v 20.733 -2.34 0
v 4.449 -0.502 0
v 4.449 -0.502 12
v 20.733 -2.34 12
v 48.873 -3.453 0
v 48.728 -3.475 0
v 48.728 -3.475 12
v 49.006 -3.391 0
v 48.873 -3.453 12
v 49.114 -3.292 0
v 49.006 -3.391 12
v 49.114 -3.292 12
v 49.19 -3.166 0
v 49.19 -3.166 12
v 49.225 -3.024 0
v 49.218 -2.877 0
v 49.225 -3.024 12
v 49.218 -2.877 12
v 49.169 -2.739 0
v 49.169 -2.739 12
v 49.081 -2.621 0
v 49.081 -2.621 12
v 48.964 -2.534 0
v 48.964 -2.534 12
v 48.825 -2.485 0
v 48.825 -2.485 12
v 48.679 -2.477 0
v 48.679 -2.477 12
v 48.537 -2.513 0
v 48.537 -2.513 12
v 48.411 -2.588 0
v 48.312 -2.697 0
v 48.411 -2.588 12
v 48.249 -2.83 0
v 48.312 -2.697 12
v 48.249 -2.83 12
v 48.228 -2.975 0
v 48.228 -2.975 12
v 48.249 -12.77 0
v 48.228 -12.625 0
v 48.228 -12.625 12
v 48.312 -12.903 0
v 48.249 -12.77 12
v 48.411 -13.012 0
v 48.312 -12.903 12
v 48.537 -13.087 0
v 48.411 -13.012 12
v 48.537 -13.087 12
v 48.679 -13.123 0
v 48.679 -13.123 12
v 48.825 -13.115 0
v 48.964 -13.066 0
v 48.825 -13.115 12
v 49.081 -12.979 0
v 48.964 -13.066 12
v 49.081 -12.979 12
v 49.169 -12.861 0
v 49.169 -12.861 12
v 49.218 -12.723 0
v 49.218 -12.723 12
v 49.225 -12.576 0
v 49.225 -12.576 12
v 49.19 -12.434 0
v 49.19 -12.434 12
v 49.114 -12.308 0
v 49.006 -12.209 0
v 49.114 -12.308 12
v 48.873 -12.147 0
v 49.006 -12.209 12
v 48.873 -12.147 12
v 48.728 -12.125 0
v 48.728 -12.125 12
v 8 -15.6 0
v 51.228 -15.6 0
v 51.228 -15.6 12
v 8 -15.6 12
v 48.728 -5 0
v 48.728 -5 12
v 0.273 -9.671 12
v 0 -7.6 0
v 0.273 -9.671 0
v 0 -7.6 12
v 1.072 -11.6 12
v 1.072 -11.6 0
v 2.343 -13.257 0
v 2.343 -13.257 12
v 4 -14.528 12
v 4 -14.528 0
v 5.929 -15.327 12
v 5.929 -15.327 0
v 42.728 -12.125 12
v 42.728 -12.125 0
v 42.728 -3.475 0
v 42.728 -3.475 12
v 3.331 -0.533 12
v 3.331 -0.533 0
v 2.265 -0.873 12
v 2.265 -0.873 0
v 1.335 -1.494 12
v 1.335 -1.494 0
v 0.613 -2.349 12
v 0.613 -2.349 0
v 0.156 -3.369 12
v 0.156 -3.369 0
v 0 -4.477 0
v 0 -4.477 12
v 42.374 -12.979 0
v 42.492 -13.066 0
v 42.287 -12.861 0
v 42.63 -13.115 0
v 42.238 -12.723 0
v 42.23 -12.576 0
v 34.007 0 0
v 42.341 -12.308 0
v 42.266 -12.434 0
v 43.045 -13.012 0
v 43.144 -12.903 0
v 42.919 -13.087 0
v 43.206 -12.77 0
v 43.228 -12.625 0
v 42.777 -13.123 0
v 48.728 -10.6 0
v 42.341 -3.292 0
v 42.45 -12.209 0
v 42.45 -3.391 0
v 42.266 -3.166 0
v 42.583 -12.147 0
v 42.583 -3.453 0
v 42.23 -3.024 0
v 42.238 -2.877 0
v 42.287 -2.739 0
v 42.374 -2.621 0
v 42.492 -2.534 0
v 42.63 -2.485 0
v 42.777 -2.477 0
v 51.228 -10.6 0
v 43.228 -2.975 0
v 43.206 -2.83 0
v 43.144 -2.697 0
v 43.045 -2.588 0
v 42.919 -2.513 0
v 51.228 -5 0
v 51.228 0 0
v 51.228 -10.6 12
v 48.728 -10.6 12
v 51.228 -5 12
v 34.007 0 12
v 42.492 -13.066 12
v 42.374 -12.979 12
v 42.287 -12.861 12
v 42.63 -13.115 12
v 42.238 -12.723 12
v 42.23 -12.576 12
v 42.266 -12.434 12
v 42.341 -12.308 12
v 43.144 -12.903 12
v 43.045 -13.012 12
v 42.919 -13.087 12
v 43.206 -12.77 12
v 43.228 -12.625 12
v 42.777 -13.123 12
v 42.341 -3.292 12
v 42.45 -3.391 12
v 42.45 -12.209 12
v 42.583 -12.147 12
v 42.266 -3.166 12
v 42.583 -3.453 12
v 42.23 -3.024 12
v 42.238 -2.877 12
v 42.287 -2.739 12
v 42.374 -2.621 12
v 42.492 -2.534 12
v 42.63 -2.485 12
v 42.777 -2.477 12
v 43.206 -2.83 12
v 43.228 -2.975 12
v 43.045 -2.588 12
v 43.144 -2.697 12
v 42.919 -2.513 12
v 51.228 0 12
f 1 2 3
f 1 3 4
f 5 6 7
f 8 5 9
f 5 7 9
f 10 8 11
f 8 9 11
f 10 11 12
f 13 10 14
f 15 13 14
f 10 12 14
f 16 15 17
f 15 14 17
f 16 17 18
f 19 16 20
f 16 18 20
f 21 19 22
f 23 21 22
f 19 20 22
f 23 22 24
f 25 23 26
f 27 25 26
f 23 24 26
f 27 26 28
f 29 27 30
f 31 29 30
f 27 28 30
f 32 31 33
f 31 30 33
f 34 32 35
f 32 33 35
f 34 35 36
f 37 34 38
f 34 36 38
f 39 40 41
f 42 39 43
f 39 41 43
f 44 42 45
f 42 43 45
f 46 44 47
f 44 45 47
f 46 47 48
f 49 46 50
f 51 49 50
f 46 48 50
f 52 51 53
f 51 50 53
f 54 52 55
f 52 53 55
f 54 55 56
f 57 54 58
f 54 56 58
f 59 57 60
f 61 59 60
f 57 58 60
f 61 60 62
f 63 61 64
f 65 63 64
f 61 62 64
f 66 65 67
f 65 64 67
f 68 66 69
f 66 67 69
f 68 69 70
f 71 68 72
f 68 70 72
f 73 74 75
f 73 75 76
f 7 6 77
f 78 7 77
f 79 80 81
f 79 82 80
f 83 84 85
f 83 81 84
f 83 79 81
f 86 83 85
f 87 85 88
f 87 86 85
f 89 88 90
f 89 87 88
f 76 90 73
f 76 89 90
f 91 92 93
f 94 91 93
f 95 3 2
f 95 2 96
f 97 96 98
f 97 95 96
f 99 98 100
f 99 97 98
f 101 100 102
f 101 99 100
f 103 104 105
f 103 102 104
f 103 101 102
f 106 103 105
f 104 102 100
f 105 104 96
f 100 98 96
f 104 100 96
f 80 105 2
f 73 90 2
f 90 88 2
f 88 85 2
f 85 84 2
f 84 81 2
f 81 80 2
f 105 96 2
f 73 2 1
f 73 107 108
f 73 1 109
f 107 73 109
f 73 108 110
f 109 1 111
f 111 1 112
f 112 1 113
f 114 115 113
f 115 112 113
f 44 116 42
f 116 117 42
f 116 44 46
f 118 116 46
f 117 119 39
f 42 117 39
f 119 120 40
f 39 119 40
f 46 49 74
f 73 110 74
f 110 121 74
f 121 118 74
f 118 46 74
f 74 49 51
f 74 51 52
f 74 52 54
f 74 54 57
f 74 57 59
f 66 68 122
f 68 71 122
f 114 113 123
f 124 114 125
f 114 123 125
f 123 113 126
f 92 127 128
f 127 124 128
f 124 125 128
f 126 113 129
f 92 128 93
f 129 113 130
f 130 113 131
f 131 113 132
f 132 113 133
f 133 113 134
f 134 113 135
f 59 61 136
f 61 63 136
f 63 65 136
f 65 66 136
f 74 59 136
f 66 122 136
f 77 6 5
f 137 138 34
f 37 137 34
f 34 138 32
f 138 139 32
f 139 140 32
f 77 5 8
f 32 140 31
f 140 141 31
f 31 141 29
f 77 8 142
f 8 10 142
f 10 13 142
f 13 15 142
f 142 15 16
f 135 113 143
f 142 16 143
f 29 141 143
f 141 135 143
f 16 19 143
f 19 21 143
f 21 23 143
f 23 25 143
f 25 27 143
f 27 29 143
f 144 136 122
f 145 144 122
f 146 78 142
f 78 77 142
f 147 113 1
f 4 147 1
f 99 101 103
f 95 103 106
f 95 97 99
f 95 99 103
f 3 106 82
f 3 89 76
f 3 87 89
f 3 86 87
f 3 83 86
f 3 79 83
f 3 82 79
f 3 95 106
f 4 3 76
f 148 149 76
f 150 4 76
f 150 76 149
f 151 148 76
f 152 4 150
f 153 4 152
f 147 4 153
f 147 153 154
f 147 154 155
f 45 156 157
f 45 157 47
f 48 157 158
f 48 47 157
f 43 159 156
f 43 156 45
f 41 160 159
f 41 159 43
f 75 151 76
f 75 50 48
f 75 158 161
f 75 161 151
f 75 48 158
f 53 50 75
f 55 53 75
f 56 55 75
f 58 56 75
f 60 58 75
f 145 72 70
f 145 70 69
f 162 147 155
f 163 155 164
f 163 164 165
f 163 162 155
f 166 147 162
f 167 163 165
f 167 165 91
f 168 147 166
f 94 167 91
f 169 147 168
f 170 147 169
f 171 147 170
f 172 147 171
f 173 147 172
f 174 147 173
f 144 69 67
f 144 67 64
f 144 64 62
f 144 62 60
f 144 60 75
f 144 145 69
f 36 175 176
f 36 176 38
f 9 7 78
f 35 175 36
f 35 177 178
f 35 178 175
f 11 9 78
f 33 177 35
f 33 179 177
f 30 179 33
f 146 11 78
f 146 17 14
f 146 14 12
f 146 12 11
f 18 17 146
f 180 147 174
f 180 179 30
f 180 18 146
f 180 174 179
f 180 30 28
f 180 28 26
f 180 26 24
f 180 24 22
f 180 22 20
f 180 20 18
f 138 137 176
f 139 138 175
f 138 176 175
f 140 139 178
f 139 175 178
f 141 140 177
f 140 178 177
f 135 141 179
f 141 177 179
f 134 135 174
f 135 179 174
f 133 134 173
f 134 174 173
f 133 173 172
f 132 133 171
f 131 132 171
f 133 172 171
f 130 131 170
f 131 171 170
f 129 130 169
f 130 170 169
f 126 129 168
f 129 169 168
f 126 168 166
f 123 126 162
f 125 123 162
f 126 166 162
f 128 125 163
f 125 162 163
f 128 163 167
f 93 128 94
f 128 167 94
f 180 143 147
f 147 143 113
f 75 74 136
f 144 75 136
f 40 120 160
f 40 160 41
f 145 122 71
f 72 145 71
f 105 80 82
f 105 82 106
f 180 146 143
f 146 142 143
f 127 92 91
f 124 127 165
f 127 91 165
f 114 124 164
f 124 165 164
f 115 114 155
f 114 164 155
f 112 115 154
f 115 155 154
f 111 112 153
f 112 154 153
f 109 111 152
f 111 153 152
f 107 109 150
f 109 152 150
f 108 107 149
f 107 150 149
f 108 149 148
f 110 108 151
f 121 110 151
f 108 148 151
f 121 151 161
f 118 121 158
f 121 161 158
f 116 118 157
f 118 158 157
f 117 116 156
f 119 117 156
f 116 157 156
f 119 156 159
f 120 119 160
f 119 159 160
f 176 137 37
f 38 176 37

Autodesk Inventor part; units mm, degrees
ref_plane "YZ Plane" through (0, 0, 0) normal (1, 0, 0) x (0, 1, 0)
ref_plane "XZ Plane" through (0, 0, 0) normal (0, 1, 0) x (-1, 0, 0)
ref_plane "XY Plane" through (0, 0, 0) normal (0, 0, 1) x (1, 0, 0)
sketch "Sketch5" plane through (0, 0, 0) normal (0, 0, 1) x (1, 0, 0)
  line L0 (51.2279, -15.6) -> (51.2279, -10.6)
  line L1 (51.2279, -10.6) -> (48.7279, -10.6)
  line L2 (48.7279, -10.6) -> (48.7279, -12.625)
  line L3 (42.7279, -12.625) -> (42.7279, -2.975)
  line L4 (48.7279, -2.975) -> (48.7279, -5)
  line L5 (48.7279, -5) -> (51.2279, -5)
  line L6 (51.2279, -5) -> (51.2279, 0)
  line L7 (42.7279, -2.975) -> (48.7279, -2.975)
  line L8 (42.7279, -12.625) -> (48.7279, -12.625)
  line L9 (51.2279, -15.6) -> (43.6357, -15.6)
  line L10 (39.8786, -15.6) -> (43.6357, -15.6)
  line L11 (0, -15.6) -> (39.8786, -15.6)
  line L12 (36.9909, 0) -> (51.2279, 0)
  line L13 (0, -15.6) -> (0, -5.4692)
  line L14 (36.9909, 0) -> (31.0226, 0)
  line L15 (0, 0) -> (0, -5.4692)
  line L16 (34.0067, 0) -> (20.7329, -2.3405)
  line L17 (0, 0) -> (20.7329, -2.3405)
  point P0 (44.1094, 0)
  dimension "d41" = 6
  dimension "d50" = 2.5
  dimension "d87" = 5.6
  dimension "d88" = 9.65
  dimension "d122" = 14.237
  dimension "d123" = 2.975
  dimension "d132" = 10
extrude "Extrusion2" add sketch "Sketch5" along normal blind 12
sketch "Sketch11" plane through (0, 0, 12) normal (0, 0, 1) x (1, 0, 0)
  line L0 (42.7279, -2.975) -> (48.7279, -2.975) projected
  circle A0 centre (42.7279, -2.975) radius 0.5
  line L1 (42.7279, -12.625) -> (42.7279, -2.975) projected
  circle A1 centre (42.7279, -12.625) radius 0.5
  line L2 (48.7279, -12.625) -> (42.7279, -12.625) projected
  circle A2 centre (48.7279, -12.625) radius 0.5
  line L3 (48.7279, -2.975) -> (48.7279, -5) projected
  circle A3 centre (48.7279, -2.975) radius 0.5
  point P0 (0, 0)
  dimension "d99" = 1
  dimension "d100" = 1
  dimension "d101" = 1
  dimension "d102" = 1
extrude "Extrusion7" cut sketch "Sketch11" against normal through all
fillet "Rundung4" radius 8 1 edges at (0, -15.6, 6)
sketch "Skizze13" plane through (0, 0, 0) normal (-1, 0, 0) x (0, 0, 1)
  point P0 (0, 0)
fillet "Rundung6" radius 4 1 edges at (0, 0, 6)
equation "\"l1\" = 8"
properties part number "Maria_Greifer_Dreieck2_3D-Druck"
